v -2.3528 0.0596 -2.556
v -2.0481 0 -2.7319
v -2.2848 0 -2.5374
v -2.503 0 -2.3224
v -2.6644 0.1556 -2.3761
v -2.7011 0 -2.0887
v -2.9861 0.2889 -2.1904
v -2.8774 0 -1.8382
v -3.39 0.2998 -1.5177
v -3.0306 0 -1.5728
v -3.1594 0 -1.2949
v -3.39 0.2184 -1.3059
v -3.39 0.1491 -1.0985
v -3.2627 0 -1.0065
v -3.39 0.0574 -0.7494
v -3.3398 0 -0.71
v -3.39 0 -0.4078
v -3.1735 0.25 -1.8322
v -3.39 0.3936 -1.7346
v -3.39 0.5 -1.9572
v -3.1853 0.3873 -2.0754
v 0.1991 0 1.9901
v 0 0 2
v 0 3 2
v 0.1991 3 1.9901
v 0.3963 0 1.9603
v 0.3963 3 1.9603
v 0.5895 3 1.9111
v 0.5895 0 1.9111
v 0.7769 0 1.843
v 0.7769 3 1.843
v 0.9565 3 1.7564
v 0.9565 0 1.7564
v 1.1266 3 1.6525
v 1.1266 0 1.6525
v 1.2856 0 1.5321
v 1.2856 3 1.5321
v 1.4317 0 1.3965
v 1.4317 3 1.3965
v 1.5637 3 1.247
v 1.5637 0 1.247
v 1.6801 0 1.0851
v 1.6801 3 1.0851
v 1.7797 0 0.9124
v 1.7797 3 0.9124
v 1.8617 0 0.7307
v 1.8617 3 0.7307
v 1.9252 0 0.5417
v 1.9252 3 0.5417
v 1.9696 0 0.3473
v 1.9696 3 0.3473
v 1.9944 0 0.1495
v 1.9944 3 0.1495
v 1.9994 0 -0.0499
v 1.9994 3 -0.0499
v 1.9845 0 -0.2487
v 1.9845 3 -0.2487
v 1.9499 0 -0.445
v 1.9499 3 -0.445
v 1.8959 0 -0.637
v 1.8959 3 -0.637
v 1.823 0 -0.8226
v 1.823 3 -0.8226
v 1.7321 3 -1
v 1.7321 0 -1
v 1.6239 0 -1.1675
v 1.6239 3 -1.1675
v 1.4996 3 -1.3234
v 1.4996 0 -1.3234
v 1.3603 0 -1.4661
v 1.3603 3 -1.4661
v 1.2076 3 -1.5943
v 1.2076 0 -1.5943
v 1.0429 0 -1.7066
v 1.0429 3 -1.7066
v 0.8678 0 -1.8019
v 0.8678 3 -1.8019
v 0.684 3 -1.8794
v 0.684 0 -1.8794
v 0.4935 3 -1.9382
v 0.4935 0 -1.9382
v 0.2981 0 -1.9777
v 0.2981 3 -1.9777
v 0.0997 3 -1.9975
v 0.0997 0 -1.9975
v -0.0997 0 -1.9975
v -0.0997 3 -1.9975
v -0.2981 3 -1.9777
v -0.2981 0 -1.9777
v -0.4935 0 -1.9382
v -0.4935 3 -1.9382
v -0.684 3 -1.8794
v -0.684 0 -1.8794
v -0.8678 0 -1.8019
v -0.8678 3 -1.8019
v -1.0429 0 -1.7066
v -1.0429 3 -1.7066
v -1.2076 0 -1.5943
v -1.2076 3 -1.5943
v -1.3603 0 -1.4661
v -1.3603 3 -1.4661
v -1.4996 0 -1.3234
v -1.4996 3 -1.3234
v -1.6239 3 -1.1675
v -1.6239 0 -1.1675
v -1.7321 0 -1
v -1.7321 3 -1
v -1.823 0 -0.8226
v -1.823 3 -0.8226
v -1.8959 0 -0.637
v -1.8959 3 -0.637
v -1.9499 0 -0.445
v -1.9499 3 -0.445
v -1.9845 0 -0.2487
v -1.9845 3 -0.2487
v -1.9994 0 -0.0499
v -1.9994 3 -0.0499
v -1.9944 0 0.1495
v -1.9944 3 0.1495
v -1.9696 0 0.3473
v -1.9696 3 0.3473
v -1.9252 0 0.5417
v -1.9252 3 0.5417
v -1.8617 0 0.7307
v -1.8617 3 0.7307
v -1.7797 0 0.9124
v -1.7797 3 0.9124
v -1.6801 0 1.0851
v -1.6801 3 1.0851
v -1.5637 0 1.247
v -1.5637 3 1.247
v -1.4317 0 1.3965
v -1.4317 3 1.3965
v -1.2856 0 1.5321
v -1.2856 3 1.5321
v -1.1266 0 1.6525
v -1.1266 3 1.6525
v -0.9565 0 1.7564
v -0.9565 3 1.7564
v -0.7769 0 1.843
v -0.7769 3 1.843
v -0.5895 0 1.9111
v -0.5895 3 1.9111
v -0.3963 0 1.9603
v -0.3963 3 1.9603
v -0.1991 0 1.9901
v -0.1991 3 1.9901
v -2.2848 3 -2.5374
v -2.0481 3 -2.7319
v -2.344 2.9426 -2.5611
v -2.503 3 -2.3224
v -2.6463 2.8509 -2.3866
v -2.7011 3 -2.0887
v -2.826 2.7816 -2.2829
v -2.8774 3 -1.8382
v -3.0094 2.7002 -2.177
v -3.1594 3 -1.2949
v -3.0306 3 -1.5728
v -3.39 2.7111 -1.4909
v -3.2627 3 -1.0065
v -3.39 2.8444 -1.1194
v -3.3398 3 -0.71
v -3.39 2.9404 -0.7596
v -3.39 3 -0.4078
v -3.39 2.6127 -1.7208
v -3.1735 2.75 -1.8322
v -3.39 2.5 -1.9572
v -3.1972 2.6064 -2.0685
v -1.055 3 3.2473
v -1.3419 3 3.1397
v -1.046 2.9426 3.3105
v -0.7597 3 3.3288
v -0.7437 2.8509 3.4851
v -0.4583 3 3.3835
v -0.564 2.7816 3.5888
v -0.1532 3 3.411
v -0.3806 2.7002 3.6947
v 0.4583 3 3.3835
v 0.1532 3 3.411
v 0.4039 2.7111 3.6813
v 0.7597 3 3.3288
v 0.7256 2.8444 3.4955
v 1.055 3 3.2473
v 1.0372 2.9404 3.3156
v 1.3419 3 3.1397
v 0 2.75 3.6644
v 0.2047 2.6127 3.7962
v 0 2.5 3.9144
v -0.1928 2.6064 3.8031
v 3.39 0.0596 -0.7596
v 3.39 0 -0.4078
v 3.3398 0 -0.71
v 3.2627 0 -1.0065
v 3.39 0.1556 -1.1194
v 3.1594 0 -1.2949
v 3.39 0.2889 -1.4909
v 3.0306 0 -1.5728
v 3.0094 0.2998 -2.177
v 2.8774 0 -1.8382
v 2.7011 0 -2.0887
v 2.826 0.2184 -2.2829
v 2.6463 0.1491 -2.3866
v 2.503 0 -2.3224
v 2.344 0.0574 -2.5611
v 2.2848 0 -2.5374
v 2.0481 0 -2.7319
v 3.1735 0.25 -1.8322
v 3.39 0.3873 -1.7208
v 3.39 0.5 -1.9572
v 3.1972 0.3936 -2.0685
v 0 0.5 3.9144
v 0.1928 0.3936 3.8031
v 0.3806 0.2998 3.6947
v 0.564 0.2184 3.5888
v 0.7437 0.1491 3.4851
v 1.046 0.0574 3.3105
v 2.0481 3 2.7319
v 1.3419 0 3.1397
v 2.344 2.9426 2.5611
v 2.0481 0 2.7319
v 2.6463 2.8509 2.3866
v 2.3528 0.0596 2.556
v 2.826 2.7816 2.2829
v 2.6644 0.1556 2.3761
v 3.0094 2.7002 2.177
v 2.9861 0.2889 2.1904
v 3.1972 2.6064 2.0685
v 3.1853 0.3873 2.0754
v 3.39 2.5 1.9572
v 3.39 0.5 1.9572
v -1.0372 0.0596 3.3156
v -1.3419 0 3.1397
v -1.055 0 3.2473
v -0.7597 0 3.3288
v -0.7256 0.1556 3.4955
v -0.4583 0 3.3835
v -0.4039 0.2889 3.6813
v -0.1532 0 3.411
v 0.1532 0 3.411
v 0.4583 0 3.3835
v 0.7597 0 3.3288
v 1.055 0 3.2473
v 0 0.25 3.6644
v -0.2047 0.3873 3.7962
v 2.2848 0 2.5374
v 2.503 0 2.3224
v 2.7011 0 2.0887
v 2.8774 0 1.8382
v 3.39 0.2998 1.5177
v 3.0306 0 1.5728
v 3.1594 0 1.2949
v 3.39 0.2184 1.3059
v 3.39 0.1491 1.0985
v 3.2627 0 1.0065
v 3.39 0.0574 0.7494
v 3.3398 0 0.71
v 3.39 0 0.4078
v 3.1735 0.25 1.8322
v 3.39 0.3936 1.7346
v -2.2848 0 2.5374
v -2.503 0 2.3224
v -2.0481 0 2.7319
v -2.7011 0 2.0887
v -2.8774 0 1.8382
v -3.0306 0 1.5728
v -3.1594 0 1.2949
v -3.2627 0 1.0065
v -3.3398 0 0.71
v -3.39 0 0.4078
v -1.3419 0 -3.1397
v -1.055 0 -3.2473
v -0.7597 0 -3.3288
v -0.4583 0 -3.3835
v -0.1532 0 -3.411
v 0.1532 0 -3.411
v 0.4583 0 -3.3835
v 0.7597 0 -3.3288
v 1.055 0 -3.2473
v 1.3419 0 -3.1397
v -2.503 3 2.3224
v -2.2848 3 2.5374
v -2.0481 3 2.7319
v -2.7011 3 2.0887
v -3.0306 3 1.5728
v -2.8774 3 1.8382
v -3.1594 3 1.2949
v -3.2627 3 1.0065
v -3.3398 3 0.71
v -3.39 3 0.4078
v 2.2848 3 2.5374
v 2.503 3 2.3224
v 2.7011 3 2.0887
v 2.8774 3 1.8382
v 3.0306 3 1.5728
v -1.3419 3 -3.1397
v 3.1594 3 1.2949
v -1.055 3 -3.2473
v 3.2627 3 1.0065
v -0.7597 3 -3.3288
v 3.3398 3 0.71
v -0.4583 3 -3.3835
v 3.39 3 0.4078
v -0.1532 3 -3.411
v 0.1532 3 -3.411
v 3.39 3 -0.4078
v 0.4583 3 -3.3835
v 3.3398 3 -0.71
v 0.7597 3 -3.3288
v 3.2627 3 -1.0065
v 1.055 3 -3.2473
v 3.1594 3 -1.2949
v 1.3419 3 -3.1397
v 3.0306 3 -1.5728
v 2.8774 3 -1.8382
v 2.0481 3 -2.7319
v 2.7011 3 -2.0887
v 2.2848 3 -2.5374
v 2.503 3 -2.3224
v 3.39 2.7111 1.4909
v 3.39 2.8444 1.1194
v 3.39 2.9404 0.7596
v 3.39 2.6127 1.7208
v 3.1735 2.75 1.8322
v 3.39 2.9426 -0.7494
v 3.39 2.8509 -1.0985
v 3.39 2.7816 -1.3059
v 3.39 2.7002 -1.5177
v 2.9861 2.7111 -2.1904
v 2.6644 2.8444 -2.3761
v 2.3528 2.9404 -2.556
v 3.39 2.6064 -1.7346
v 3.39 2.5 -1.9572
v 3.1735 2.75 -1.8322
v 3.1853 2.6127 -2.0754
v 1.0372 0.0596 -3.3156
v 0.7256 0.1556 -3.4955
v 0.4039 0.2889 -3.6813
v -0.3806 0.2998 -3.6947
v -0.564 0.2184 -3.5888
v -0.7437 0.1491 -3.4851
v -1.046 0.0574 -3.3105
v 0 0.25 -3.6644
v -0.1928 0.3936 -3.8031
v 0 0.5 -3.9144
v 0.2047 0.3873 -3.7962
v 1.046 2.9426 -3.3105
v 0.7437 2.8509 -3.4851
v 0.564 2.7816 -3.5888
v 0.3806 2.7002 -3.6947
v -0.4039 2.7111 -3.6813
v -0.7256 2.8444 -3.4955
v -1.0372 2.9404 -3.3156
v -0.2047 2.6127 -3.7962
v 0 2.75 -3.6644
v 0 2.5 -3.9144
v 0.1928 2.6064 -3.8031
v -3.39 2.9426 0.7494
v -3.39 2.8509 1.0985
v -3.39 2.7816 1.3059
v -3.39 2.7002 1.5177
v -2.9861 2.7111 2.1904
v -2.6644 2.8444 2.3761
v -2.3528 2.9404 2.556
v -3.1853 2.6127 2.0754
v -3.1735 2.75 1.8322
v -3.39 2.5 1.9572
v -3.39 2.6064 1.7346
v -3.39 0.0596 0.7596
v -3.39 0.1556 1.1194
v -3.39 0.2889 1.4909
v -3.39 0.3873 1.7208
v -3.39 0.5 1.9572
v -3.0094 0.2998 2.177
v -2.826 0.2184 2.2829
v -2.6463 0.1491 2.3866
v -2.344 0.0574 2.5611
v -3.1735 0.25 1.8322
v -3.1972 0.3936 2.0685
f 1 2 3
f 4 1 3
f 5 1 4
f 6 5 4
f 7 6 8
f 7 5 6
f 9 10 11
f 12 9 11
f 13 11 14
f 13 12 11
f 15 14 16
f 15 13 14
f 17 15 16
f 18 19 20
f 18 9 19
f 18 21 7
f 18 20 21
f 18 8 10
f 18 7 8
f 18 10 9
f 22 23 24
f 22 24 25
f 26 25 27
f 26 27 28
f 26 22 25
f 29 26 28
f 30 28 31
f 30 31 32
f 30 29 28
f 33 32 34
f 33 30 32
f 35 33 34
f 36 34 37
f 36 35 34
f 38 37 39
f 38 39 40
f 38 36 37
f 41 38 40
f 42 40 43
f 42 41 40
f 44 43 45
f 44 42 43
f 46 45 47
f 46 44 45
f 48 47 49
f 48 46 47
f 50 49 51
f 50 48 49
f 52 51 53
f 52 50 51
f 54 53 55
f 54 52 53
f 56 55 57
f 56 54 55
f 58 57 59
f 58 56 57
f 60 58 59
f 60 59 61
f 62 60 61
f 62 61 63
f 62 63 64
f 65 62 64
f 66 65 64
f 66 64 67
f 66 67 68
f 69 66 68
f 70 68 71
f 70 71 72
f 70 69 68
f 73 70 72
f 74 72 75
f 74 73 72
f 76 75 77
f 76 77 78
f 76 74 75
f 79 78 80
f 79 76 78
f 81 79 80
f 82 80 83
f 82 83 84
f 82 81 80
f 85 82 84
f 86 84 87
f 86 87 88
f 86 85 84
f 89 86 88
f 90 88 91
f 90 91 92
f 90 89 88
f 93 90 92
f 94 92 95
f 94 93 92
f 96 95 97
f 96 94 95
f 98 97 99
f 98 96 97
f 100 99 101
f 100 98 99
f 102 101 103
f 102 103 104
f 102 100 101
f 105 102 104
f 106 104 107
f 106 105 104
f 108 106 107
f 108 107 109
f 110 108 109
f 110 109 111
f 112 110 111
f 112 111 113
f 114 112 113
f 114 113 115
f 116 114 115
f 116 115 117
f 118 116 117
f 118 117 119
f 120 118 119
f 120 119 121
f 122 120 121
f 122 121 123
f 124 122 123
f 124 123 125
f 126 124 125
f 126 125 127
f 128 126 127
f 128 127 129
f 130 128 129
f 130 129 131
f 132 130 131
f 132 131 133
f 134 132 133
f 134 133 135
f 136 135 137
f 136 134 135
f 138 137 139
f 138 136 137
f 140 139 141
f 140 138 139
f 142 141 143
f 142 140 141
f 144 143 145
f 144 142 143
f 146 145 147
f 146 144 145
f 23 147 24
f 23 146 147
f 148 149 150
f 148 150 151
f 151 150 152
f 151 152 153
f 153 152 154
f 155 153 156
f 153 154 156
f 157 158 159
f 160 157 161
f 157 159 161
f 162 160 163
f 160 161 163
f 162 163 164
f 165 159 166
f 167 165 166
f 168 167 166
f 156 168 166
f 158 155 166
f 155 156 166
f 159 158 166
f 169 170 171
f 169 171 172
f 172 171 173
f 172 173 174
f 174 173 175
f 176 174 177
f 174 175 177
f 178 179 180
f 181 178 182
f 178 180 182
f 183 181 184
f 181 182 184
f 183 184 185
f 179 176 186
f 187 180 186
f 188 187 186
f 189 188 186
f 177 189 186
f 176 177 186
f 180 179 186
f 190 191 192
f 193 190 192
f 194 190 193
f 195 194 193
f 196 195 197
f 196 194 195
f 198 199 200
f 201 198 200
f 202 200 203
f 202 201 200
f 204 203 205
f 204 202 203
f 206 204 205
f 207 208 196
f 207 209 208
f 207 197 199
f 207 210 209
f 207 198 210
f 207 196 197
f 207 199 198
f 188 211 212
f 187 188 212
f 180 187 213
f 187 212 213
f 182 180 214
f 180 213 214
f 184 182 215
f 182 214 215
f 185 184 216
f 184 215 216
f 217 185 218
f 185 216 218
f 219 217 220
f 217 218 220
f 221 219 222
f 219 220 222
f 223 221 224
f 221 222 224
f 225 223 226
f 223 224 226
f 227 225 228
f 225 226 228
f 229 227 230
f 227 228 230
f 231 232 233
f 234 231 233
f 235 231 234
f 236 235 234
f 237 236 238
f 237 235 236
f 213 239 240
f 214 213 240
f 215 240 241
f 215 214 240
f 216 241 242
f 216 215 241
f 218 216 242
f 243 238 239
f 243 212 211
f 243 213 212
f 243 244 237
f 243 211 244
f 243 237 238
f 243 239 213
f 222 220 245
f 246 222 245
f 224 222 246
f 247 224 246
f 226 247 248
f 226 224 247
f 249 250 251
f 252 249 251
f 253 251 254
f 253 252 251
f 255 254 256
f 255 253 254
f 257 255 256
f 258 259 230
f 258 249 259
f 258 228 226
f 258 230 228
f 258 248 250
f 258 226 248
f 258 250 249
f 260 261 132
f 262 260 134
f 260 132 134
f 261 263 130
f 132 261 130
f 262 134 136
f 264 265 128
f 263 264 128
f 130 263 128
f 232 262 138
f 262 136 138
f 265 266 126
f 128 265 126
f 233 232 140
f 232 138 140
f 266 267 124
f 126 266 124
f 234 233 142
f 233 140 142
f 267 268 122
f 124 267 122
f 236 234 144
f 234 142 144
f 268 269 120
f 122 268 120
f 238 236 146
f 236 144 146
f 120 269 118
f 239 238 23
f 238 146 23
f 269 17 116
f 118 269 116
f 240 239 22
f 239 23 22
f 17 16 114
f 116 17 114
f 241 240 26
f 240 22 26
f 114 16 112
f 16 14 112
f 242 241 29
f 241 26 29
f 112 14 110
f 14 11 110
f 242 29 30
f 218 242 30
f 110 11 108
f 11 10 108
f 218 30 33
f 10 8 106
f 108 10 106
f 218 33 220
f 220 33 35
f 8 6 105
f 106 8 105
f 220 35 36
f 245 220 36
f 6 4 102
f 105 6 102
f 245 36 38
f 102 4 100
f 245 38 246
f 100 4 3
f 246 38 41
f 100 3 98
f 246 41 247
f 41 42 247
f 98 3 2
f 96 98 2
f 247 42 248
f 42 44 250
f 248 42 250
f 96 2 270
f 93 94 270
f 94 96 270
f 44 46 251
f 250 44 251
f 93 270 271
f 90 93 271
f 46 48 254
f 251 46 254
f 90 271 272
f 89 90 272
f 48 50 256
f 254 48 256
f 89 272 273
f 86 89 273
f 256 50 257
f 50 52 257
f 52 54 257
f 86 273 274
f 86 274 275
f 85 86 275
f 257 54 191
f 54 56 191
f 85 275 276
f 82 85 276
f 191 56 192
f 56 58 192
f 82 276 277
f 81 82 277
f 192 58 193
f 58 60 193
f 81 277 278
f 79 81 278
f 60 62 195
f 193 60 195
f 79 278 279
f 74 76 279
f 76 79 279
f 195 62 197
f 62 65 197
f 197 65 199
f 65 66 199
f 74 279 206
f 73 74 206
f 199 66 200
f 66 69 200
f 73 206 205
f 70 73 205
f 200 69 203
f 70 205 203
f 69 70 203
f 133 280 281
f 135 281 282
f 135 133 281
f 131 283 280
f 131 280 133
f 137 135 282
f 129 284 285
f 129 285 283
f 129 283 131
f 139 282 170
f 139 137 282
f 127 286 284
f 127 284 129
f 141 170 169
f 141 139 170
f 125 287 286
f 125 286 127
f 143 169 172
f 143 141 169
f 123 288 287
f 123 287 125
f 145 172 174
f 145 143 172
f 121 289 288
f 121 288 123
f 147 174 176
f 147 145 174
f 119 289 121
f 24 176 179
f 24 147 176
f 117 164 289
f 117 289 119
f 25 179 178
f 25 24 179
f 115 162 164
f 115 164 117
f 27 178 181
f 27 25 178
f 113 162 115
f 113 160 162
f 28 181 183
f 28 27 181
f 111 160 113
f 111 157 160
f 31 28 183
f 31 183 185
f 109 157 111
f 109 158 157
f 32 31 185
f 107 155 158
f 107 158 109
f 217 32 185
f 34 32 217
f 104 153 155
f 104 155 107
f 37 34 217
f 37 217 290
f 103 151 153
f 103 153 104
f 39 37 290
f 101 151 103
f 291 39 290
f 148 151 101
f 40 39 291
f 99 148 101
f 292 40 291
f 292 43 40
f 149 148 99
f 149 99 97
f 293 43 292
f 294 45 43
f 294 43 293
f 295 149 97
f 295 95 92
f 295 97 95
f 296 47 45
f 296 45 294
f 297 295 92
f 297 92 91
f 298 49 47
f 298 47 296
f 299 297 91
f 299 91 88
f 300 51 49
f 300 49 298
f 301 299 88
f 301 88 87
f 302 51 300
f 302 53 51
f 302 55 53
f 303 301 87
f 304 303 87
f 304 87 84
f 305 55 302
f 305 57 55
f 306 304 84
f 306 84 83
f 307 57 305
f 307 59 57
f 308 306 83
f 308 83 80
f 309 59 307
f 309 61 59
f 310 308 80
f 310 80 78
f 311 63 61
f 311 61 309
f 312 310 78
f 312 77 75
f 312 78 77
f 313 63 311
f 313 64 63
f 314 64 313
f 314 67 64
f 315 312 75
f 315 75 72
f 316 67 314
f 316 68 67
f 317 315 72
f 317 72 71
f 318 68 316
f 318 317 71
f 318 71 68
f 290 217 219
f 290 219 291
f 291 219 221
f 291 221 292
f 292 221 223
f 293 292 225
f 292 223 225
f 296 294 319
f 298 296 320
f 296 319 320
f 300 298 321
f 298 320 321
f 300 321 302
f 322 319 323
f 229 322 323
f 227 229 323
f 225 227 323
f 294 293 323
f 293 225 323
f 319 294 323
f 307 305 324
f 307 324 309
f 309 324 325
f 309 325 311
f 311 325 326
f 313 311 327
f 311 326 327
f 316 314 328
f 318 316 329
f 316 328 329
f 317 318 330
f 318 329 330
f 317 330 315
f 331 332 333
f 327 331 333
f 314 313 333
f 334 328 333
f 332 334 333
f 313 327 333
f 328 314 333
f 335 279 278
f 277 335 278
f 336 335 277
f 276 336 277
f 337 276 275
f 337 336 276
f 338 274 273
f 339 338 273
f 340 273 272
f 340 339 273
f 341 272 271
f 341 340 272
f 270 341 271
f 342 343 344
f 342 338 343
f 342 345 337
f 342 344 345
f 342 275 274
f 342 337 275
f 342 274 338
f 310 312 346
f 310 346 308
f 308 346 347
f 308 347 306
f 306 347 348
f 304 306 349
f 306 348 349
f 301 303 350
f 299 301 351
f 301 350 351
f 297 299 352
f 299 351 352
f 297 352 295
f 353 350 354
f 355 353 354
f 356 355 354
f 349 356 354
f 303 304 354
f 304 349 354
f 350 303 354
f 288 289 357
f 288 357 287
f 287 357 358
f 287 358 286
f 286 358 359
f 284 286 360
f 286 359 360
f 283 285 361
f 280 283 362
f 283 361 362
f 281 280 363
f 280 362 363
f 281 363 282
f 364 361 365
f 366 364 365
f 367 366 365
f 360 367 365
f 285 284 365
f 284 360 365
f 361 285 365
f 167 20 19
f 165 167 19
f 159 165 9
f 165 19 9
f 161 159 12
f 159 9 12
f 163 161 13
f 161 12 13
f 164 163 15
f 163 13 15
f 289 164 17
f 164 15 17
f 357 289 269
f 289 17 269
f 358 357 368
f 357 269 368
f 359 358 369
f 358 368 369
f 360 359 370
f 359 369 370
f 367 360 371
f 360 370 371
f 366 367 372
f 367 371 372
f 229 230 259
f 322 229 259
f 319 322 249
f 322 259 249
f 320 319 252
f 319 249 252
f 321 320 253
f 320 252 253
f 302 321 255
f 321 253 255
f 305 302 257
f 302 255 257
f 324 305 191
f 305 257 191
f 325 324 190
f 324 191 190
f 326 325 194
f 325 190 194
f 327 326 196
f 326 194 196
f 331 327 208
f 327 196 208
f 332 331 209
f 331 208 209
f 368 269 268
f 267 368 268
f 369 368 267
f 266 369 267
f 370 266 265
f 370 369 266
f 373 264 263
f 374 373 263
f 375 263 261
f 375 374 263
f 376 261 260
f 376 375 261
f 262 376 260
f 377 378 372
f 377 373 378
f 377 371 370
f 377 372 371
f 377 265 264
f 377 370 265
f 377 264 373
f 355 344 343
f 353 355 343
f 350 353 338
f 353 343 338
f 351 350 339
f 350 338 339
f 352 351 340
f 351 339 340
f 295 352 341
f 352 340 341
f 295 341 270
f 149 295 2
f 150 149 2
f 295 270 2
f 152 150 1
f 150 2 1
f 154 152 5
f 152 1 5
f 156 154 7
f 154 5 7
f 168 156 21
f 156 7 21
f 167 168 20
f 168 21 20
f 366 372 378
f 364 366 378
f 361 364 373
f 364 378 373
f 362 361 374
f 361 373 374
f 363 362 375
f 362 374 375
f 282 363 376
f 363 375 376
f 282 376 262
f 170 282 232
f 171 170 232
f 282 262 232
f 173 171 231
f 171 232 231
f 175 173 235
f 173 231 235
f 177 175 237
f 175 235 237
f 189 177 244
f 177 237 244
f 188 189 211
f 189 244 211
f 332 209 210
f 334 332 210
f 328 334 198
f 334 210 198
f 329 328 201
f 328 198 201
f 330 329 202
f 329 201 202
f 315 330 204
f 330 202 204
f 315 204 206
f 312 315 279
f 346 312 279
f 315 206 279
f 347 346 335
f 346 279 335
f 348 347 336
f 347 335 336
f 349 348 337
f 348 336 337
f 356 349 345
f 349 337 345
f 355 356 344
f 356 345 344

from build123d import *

# Parameters (mm, degrees)
SKETCH_1_R      = 2
EXTRUDE_1_DEPTH = 3


with BuildPart() as part:
    # 草图1 → 凸台-拉伸1 (new body)
    with BuildSketch(Plane(origin=(0, 0, 0), x_dir=(1, 0, 0), z_dir=(0, 1, 0))):
        Polygon((0, 3.914434825), (-3.39, 1.957217413), (-3.39, -1.957217413), (0, -3.914434825), (3.39, -1.957217413), (3.39, 1.957217413), align=None)
        with Locations(Location((0, 0, 0), (0, 0, 270))):
            Circle(SKETCH_1_R, mode=Mode.SUBTRACT)
    extrude(amount=EXTRUDE_1_DEPTH)

    # 草图12 → 切除-旋转1 (revolve, cut)
    with BuildSketch(Plane(origin=(0, 0, 0), x_dir=(-0.8660254037844386, 0, -0.5000000000000003), z_dir=(0.5000000000000002, 0, -0.8660254037844385))):
        Polygon((-3.414434825, 3), (-3.914434825, 2.5), (-3.914434825, 3), align=None)
    cut_revolve_1 = revolve(axis=Axis((0, 3, 0), (0, 1, 0)), mode=Mode.SUBTRACT)

    # 镜向1: 切除-旋转1 across plane
    add(cut_revolve_1.mirror(Plane.ZX.offset(1.5)), mode=Mode.SUBTRACT)


solid = part.part
